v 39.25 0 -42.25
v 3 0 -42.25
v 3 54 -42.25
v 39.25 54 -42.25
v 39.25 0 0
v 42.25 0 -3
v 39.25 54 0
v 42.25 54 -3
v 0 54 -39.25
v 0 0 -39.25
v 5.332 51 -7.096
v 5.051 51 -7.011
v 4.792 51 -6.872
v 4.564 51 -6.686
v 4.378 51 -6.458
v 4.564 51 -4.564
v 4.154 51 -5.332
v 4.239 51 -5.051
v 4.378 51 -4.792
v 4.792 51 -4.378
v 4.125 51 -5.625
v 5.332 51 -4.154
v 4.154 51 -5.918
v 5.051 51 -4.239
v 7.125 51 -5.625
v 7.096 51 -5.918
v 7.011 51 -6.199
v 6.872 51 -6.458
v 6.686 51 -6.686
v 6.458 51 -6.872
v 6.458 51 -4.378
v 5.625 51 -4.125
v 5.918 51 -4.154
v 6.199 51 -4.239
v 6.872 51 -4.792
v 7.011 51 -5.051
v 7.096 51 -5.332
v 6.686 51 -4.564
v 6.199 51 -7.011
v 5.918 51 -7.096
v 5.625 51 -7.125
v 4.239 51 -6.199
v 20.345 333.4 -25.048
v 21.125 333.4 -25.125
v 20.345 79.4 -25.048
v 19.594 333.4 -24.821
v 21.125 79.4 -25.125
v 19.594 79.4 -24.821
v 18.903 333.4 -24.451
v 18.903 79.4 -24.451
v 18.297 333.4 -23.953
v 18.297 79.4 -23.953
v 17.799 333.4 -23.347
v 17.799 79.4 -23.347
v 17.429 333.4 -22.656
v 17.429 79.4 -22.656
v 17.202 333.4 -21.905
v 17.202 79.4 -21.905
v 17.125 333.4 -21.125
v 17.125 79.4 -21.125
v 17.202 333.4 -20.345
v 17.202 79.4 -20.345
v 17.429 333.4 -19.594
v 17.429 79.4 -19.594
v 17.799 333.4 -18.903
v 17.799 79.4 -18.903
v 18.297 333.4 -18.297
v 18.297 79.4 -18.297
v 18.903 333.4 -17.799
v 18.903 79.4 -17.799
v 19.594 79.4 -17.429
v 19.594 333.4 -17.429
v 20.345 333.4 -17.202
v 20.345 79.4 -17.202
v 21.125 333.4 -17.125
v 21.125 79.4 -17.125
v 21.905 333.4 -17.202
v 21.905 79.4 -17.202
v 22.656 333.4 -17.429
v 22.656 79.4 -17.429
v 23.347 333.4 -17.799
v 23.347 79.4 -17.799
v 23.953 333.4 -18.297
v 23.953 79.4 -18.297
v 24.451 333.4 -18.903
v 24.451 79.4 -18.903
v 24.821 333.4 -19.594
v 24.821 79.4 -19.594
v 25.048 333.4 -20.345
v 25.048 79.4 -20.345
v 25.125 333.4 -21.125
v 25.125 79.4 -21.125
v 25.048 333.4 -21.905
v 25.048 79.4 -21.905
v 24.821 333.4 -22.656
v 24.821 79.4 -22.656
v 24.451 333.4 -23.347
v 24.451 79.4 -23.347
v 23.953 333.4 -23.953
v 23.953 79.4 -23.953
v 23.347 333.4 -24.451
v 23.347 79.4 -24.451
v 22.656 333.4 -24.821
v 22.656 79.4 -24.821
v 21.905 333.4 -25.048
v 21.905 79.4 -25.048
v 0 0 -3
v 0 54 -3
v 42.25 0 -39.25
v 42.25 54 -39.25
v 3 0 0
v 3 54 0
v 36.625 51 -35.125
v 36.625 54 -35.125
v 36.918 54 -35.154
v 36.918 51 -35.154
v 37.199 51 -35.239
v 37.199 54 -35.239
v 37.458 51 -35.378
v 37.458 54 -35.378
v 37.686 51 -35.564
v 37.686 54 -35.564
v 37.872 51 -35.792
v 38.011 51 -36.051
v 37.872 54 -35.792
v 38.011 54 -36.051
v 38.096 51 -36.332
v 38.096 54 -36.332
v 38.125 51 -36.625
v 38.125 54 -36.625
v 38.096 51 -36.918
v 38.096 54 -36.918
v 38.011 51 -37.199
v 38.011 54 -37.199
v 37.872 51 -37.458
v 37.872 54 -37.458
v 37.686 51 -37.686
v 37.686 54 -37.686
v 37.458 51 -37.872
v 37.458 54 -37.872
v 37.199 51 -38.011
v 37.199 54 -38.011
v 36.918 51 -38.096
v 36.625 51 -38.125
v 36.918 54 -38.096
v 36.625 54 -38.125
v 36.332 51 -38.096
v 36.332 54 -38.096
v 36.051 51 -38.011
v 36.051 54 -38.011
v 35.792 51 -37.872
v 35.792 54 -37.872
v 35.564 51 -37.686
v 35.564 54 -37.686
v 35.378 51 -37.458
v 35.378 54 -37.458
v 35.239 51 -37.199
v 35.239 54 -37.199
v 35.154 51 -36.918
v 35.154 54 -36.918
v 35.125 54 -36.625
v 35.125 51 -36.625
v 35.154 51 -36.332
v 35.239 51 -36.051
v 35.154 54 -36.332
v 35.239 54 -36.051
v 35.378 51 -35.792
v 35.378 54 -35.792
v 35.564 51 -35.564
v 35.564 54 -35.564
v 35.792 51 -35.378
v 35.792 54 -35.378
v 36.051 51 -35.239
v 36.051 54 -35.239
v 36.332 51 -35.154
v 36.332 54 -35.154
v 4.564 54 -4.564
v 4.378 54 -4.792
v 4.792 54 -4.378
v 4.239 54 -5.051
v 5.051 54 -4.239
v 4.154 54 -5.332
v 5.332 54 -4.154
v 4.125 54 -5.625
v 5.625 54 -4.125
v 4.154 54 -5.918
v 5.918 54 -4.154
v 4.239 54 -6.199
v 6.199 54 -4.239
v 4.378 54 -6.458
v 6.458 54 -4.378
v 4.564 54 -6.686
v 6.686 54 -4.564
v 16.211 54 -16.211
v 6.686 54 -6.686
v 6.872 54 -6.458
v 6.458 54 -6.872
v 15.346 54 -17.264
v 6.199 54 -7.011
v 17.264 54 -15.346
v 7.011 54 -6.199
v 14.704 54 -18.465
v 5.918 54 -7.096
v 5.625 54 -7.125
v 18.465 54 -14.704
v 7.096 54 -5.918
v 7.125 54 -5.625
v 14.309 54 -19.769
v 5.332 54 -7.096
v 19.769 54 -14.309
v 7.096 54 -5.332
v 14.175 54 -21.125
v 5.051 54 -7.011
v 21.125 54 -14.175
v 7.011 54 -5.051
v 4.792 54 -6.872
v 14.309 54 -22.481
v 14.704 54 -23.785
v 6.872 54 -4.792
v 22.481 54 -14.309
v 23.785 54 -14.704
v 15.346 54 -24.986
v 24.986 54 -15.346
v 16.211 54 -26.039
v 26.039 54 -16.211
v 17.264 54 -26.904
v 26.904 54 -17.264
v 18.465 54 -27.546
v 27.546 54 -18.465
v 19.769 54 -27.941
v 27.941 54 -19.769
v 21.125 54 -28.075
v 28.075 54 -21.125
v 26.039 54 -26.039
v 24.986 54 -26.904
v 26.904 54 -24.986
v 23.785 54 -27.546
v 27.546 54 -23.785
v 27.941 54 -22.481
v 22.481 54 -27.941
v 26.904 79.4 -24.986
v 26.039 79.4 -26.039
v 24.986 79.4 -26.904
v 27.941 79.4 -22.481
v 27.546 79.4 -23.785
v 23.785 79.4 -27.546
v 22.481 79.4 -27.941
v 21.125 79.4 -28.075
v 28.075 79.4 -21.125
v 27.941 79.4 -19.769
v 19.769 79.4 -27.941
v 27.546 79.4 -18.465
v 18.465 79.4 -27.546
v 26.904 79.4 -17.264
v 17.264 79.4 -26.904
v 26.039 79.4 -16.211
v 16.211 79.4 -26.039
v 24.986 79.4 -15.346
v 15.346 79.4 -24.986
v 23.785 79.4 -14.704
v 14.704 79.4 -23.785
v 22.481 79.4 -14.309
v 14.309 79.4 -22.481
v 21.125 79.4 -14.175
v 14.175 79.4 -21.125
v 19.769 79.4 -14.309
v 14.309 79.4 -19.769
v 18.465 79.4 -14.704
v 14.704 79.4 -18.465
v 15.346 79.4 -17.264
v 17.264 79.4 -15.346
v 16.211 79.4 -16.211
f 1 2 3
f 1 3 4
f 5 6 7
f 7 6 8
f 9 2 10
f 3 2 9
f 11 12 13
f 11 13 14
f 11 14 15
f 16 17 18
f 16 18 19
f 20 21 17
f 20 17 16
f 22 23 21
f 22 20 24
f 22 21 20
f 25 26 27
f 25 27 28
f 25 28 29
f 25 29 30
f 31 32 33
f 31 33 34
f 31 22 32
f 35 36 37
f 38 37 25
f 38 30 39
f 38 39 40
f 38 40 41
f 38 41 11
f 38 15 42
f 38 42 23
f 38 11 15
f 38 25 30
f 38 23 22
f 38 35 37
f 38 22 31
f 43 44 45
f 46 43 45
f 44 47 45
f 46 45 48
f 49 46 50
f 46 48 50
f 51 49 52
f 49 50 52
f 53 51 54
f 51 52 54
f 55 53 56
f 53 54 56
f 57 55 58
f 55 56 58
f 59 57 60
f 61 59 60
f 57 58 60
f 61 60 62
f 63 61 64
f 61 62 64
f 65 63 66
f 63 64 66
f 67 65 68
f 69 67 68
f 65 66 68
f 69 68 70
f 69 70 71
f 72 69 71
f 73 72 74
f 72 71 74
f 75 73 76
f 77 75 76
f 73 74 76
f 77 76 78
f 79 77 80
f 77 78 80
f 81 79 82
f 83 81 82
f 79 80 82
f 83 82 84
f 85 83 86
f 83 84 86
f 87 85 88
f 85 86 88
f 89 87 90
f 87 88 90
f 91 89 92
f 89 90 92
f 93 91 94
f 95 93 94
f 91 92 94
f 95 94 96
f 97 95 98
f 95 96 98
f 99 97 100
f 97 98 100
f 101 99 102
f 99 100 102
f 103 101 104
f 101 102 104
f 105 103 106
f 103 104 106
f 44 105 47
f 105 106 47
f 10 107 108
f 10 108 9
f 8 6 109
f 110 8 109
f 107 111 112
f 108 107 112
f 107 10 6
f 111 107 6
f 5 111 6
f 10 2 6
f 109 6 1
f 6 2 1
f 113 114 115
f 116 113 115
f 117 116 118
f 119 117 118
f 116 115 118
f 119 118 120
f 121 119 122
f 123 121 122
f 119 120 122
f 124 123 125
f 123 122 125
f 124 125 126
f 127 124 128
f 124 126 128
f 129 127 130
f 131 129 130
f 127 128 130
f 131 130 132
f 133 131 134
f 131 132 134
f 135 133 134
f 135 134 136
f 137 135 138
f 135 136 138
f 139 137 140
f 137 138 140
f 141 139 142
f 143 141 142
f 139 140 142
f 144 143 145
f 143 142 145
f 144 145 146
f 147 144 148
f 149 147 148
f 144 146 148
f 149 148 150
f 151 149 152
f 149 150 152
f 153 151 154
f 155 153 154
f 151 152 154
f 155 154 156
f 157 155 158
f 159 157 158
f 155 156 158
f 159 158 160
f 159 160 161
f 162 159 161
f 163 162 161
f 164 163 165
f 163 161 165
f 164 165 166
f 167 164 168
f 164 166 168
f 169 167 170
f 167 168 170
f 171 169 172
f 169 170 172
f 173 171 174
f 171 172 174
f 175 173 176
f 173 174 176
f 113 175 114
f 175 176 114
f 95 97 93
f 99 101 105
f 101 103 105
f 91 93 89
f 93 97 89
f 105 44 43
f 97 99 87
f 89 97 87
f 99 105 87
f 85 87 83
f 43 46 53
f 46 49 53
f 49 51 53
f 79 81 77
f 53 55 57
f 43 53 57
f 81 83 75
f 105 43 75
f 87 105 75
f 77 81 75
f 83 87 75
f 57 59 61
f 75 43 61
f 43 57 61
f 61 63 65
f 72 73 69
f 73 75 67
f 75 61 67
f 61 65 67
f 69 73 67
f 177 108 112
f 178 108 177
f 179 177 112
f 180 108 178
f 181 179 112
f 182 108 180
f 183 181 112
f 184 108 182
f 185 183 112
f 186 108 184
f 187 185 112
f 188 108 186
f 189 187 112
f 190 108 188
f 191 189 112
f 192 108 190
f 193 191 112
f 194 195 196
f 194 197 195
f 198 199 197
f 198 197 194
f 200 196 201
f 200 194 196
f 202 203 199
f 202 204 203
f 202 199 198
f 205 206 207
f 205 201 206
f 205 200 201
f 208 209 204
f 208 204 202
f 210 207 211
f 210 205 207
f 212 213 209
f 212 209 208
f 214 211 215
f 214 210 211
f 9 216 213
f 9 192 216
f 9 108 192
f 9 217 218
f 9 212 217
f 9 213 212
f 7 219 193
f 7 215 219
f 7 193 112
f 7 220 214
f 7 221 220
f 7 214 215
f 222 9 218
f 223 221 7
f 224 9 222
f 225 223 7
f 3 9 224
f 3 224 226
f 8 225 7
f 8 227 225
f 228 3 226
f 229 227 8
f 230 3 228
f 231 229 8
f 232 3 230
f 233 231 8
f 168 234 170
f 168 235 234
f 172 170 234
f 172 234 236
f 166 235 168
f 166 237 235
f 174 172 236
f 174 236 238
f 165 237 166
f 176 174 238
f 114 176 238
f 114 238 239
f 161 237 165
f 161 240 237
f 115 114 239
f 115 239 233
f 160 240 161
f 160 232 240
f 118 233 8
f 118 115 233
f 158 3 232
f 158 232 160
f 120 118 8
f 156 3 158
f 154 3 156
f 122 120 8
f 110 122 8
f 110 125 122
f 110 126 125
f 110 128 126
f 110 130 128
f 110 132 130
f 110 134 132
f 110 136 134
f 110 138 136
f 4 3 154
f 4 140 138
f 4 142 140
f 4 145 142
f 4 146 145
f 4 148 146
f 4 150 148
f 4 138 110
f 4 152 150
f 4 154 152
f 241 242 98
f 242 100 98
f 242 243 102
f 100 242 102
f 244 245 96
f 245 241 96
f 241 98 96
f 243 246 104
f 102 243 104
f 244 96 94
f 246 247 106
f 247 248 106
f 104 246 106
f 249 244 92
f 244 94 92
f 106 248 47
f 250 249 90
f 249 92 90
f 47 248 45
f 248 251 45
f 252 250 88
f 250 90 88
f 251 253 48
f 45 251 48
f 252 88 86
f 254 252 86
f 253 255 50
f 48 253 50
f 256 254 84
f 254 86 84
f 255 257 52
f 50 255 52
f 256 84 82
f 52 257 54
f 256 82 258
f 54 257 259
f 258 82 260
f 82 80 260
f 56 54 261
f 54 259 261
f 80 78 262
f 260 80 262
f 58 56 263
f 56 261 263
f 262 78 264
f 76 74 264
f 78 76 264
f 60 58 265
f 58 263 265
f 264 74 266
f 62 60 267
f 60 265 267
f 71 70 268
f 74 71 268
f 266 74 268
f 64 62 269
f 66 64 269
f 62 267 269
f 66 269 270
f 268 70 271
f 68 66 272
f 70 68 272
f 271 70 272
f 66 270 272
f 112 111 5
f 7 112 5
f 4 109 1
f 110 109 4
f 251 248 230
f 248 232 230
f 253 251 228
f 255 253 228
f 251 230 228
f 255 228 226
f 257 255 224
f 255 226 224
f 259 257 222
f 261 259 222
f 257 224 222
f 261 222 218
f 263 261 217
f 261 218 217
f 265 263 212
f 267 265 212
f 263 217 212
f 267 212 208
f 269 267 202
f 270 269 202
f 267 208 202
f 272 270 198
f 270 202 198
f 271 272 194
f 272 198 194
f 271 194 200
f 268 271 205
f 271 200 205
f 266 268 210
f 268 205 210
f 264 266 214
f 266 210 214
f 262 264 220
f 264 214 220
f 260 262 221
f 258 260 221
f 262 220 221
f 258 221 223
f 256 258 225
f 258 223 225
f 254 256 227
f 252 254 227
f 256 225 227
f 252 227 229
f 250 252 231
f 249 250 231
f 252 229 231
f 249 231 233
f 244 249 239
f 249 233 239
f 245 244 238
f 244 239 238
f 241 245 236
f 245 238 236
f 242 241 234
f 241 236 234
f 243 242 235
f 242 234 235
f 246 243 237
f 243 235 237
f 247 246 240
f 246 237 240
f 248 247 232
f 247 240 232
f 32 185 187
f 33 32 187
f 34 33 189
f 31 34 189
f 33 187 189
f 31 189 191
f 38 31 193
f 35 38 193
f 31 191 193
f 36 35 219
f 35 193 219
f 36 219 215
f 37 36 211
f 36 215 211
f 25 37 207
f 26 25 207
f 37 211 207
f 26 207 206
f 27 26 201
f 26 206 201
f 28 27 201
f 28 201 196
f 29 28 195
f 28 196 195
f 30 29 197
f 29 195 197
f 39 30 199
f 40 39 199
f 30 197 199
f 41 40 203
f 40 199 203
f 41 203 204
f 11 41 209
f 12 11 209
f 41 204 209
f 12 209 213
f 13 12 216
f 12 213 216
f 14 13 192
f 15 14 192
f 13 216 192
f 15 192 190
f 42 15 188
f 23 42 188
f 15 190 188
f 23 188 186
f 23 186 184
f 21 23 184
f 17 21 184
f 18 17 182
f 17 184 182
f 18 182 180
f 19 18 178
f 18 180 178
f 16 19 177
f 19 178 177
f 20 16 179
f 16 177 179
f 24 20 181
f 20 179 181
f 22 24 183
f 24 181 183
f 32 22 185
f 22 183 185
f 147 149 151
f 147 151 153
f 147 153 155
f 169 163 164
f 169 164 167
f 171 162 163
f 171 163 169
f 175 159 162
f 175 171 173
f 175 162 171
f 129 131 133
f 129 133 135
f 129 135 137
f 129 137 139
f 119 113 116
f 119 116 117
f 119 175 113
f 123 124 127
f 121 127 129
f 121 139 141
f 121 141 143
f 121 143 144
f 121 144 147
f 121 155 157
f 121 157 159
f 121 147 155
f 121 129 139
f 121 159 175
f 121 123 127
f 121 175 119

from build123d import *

# Parameters (mm, degrees)
SKETCH1_W           = 42.25
SKETCH1_H           = 42.25
BOSS_EXTRUDE1_DEPTH = 54
SKETCH2_R           = 1.5
CUT_EXTRUDE1_DEPTH  = 3
CHAMFER1_SIZE       = 3


with BuildPart() as part:
    # Sketch1 → Boss-Extrude1 (new body)
    with BuildSketch(Plane(origin=(0, 0, 0), x_dir=(1, 0, 0), z_dir=(0, 1, 0))):
        with Locations((21.125, 21.125)):
            Rectangle(SKETCH1_W, SKETCH1_H)
    extrude(amount=BOSS_EXTRUDE1_DEPTH)

    # Sketch2 → Cut-Extrude1 (cut)
    with BuildSketch(Plane(origin=(0, 54, 0), x_dir=(1, 0, 0), z_dir=(0, 1, 0))):
        with Locations(Location((36.625, 36.625, 0), (0, 0, 270))):
            Circle(SKETCH2_R)
        with Locations(Location((5.625, 5.625, 0), (0, 0, 270))):
            Circle(SKETCH2_R)
    extrude(amount=-CUT_EXTRUDE1_DEPTH, mode=Mode.SUBTRACT)

    # Chamfer1
    chamfer1_edges = [part.edges().sort_by_distance(p)[0] for p in [
        (0, 27, -42.25),
        (42.25, 27, -42.25),
        (42.25, 27, 0),
        (0, 27, 0),
    ]]
    chamfer(chamfer1_edges, length=CHAMFER1_SIZE)

    # Sketch3 → Revolve1 (revolve)
    with BuildSketch(Plane.ZY.offset(-21.125)):
        Polygon((-21.125, 54), (-21.125, 333.4), (-25.125, 333.4), (-25.125, 79.4), (-28.075, 79.4), (-28.075, 54), align=None)
    revolve(axis=Axis((21.125, 54, -21.125), (0, 1, 0)))


solid = part.part
